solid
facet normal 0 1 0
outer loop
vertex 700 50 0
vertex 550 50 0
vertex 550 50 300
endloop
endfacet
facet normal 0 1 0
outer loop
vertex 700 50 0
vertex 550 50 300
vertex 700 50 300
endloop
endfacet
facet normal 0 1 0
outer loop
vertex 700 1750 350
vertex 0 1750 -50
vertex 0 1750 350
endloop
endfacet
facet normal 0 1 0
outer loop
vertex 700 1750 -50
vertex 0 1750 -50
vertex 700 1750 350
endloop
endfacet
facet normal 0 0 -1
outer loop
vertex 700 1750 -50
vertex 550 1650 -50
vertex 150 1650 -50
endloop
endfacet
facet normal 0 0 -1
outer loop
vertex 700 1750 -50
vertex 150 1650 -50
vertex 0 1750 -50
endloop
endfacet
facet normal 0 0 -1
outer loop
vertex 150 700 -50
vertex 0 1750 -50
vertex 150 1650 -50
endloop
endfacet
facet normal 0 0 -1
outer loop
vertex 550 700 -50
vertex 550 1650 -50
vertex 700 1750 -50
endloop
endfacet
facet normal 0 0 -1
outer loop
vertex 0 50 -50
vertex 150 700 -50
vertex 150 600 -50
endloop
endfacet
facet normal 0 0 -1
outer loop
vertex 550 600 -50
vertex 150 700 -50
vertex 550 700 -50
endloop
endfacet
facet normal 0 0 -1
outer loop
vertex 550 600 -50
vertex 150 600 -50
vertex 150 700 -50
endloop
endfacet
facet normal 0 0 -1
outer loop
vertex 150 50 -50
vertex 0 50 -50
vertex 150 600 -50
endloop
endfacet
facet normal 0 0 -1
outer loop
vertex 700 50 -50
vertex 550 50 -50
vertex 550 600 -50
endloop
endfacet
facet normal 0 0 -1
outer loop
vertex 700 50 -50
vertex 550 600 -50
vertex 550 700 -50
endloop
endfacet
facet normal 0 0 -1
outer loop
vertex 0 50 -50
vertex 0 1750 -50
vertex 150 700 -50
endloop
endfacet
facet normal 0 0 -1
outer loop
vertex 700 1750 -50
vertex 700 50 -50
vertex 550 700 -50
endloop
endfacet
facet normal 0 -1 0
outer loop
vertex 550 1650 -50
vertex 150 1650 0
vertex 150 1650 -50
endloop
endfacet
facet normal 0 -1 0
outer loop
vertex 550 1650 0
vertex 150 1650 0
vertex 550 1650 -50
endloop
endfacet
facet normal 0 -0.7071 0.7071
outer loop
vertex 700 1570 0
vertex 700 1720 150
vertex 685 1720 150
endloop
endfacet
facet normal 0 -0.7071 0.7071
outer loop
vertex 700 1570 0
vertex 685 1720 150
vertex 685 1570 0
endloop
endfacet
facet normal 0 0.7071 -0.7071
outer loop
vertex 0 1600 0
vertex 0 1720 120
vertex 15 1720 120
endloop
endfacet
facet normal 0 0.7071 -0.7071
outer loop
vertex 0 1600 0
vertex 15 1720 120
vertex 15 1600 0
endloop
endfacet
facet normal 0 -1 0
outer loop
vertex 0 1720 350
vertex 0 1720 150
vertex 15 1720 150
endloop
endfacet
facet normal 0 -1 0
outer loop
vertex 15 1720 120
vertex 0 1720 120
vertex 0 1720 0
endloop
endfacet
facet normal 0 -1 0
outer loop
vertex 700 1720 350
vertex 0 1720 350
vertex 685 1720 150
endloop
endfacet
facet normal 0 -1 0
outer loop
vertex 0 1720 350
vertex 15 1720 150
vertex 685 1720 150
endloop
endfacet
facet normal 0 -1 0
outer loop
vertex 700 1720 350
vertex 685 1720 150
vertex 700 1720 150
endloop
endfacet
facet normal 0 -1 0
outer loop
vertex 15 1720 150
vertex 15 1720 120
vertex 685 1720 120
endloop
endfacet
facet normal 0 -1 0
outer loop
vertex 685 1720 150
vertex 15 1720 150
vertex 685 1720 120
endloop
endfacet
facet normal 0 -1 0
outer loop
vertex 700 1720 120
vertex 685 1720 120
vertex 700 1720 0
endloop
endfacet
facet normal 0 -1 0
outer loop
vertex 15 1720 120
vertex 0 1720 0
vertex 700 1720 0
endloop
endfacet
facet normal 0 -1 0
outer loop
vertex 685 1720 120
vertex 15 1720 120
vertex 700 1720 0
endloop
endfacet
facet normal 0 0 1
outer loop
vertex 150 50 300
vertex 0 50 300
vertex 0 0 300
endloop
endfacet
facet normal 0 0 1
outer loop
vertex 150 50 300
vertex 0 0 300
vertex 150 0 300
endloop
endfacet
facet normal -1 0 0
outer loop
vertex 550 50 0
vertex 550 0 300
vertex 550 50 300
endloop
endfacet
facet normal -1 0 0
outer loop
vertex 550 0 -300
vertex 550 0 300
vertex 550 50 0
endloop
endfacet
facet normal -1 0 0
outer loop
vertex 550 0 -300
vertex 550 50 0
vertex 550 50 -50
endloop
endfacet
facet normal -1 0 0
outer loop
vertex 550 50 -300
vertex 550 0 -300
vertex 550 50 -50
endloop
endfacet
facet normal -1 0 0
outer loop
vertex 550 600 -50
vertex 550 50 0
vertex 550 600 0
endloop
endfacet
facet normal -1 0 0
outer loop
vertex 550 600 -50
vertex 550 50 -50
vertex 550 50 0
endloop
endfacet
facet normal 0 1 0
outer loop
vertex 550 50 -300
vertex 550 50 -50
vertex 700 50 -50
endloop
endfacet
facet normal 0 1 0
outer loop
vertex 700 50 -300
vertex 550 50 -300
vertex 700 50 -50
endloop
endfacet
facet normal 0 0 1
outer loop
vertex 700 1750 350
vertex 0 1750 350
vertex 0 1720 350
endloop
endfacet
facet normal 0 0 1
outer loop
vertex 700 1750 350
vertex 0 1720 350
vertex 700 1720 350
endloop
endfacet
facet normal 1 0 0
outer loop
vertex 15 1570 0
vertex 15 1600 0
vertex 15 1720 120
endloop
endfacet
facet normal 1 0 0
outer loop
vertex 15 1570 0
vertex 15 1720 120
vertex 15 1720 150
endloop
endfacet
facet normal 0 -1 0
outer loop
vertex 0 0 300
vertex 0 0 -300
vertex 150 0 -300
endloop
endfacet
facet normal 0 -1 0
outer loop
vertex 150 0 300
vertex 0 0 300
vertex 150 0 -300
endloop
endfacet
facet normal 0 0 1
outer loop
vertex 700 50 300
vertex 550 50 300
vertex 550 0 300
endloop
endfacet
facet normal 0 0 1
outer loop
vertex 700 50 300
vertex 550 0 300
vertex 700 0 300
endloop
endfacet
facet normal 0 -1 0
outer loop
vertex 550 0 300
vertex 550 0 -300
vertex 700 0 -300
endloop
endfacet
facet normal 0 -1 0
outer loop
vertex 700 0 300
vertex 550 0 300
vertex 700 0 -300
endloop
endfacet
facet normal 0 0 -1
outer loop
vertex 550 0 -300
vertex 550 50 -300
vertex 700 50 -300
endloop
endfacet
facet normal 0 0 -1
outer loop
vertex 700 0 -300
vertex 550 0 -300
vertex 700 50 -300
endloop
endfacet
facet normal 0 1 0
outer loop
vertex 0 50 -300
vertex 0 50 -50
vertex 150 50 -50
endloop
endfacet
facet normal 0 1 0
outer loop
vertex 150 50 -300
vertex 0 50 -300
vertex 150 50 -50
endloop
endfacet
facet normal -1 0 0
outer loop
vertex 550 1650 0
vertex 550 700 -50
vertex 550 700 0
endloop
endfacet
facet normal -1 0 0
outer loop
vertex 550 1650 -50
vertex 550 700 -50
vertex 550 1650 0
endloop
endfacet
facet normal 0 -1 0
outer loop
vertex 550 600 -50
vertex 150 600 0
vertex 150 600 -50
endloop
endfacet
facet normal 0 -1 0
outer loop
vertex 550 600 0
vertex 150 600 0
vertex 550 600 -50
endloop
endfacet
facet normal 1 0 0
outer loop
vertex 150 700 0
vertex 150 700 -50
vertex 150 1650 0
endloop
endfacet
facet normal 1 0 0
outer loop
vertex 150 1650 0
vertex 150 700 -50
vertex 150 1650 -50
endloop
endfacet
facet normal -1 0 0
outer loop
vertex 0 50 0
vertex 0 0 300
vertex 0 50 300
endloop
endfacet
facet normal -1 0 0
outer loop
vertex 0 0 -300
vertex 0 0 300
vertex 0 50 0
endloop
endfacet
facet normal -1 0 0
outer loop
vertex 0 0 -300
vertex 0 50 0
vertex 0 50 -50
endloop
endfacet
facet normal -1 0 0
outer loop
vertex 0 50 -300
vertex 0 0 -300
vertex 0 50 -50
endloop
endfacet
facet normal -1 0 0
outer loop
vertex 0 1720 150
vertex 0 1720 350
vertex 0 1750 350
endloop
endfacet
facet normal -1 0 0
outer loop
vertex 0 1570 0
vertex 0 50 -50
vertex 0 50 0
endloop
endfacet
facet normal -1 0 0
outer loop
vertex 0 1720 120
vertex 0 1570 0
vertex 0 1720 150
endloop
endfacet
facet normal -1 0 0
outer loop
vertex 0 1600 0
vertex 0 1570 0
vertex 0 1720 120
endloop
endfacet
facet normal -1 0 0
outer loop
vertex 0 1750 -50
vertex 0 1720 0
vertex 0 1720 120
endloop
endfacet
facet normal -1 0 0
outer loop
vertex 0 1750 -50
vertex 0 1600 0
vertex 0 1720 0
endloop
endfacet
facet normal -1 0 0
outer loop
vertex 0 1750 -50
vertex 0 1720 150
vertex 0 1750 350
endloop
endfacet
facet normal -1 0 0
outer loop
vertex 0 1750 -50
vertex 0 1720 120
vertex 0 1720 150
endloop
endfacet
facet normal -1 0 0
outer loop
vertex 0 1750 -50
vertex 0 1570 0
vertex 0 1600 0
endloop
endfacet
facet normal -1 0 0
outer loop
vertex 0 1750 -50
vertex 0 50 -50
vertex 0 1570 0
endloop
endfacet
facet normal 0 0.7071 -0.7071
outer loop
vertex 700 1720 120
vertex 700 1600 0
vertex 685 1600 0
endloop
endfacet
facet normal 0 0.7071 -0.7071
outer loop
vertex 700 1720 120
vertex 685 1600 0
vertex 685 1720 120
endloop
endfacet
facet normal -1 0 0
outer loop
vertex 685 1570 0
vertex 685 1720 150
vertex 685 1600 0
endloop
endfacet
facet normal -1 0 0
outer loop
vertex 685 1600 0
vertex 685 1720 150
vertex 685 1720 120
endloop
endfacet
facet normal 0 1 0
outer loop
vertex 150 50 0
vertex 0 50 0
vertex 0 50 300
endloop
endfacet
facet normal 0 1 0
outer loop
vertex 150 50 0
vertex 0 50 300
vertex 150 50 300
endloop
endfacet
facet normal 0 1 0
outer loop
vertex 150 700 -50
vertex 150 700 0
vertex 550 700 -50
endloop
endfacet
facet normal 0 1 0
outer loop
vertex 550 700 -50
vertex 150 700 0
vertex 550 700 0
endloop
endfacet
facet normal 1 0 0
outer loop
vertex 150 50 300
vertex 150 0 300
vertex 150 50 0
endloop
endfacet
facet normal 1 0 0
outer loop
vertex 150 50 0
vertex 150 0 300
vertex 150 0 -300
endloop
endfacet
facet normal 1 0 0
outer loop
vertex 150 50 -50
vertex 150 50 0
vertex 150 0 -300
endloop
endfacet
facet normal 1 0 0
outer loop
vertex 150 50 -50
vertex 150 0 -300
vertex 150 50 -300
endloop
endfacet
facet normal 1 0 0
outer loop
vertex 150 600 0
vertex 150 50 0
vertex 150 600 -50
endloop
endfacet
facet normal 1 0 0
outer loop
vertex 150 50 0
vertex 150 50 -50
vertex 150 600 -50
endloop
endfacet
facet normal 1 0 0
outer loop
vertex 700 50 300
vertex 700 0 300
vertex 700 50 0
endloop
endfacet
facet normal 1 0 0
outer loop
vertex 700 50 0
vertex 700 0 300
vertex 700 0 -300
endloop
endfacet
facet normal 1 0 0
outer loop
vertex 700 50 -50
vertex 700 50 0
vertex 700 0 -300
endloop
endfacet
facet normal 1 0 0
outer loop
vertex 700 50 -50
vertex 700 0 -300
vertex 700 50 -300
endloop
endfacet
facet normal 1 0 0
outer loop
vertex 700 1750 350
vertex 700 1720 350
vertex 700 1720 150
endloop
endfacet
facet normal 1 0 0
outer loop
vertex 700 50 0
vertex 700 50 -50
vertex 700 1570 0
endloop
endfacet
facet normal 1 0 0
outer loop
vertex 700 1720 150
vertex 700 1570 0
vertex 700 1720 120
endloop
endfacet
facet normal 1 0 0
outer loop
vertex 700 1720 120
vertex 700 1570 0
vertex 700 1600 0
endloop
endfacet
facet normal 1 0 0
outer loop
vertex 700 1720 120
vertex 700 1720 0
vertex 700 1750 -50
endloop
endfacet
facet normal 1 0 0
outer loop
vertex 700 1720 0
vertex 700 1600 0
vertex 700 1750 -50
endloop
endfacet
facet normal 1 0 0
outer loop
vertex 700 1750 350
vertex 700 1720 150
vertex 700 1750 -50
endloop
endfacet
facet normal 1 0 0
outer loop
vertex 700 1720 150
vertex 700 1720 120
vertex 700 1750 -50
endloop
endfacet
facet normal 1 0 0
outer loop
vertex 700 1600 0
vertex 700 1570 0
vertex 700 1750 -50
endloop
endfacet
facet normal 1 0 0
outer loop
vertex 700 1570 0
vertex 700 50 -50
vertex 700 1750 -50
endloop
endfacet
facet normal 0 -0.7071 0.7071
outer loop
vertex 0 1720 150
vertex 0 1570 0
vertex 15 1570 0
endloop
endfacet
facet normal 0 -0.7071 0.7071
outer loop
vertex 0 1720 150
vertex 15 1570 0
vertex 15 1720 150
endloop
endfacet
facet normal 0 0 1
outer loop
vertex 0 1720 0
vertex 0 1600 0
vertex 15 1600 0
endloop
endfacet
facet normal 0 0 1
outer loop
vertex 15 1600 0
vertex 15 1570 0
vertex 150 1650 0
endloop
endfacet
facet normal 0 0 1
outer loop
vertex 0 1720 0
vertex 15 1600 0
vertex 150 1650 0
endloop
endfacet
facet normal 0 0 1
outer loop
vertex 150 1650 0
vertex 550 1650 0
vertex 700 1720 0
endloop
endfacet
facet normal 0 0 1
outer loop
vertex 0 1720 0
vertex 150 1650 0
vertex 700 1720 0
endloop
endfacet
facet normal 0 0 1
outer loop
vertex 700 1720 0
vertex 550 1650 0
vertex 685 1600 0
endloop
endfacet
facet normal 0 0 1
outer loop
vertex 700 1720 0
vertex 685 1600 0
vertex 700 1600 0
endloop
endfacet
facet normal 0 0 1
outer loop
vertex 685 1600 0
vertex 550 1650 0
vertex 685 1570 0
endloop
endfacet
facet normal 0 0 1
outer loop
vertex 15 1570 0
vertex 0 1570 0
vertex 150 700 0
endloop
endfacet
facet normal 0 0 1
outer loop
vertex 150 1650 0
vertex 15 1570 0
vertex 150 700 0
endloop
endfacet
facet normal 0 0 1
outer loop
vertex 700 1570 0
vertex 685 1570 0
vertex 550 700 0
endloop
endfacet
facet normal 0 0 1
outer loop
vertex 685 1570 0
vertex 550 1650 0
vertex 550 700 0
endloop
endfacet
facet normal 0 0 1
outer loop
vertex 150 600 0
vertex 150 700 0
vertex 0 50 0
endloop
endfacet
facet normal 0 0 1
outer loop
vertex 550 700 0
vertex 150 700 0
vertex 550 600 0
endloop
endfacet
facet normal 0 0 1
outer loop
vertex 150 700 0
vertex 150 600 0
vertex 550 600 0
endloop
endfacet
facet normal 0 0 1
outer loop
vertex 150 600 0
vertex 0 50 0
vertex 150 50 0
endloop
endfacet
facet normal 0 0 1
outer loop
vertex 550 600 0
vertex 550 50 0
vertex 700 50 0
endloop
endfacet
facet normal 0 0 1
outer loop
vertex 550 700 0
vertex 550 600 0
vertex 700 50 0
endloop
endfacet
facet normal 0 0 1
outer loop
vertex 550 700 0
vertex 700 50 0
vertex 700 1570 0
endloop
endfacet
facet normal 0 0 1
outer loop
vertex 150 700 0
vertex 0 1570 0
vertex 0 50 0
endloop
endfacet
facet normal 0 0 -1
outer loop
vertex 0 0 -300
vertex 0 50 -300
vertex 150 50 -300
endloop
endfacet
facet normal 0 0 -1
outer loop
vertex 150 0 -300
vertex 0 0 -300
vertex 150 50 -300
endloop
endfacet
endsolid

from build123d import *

# Parameters (mm, degrees)
SALIENTE_EXTRUIR1_DEPTH        = 300
SALIENTE_EXTRUIR1_DEPTH_BACK   = 300
CROQUIS1_W                     = 150
CROQUIS1_H                     = 50
SALIENTE_EXTRUIR1_2_DEPTH      = 300
SALIENTE_EXTRUIR1_2_DEPTH_BACK = 300
CROQUIS2_W                     = 150
CROQUIS2_H                     = 50
SALIENTE_EXTRUIR2_DEPTH        = 1700
CROQUIS3_W                     = 700
CROQUIS3_H                     = 100
SALIENTE_EXTRUIR3_DEPTH        = 50
CROQUIS4_W                     = 700
CROQUIS4_H                     = 30
SALIENTE_EXTRUIR4_DEPTH        = 350
SALIENTE_EXTRUIR5_DEPTH        = 15
SALIENTE_EXTRUIR6_DEPTH        = 15


with BuildPart() as part:
    # Croquis1 → Saliente-Extruir1 (new, two sides: drawn at the far end of the back side and taken through both)
    with BuildSketch(Plane.XY.offset(-SALIENTE_EXTRUIR1_DEPTH_BACK)):
        with Locations((75, 25)):
            Rectangle(CROQUIS1_W, CROQUIS1_H)
    extrude(amount=SALIENTE_EXTRUIR1_DEPTH + SALIENTE_EXTRUIR1_DEPTH_BACK)



with BuildPart() as body_2:
    # Croquis1 → Saliente-Extruir1 2 (new, two sides: drawn at the far end of the back side and taken through both)
    with BuildSketch(Plane.XY.offset(-SALIENTE_EXTRUIR1_2_DEPTH_BACK)):
        with Locations((625, 25)):
            Rectangle(CROQUIS1_W, CROQUIS1_H)
    extrude(amount=SALIENTE_EXTRUIR1_2_DEPTH + SALIENTE_EXTRUIR1_2_DEPTH_BACK)


with BuildPart() as part_1:
    add(part.part)

    add(body_2.part)  # Saliente-Extruir2 merges body 2
    # Croquis2 → Saliente-Extruir2 (add)
    with BuildSketch(Plane(origin=(0, 50, 0), x_dir=(1, 0, 0), z_dir=(0, 1, 0))):
        with Locations((75, 25)):
            Rectangle(CROQUIS2_W, CROQUIS2_H)
        with Locations((625, 25)):
            Rectangle(CROQUIS2_W, CROQUIS2_H)
    extrude(amount=SALIENTE_EXTRUIR2_DEPTH)

    # Croquis3 → Saliente-Extruir3 (add)
    with BuildSketch(Plane.XY):
        with Locations((350, 650)):
            Rectangle(CROQUIS3_W, CROQUIS3_H)
        with Locations((350, 1700)):
            Rectangle(CROQUIS3_W, CROQUIS3_H)
    extrude(amount=-SALIENTE_EXTRUIR3_DEPTH)

    # Croquis4 → Saliente-Extruir4 (add)
    with BuildSketch(Plane.XY):
        with Locations((350, 1735)):
            Rectangle(CROQUIS4_W, CROQUIS4_H)
    extrude(amount=SALIENTE_EXTRUIR4_DEPTH)

    # Croquis5 → Saliente-Extruir5 (add)
    with BuildSketch(Plane.ZY):
        Polygon((0, 1570), (150, 1720), (120, 1720), (0, 1600), align=None)
    extrude(amount=-SALIENTE_EXTRUIR5_DEPTH)

    # Croquis6 → Saliente-Extruir6 (add)
    with BuildSketch(Plane(origin=(700, 0, 0), x_dir=(0, 0, -1), z_dir=(1, 0, 0))):
        Polygon((0, 1570), (0, 1600), (-120, 1720), (-150, 1720), align=None)
    extrude(amount=-SALIENTE_EXTRUIR6_DEPTH)


solid = part_1.part
